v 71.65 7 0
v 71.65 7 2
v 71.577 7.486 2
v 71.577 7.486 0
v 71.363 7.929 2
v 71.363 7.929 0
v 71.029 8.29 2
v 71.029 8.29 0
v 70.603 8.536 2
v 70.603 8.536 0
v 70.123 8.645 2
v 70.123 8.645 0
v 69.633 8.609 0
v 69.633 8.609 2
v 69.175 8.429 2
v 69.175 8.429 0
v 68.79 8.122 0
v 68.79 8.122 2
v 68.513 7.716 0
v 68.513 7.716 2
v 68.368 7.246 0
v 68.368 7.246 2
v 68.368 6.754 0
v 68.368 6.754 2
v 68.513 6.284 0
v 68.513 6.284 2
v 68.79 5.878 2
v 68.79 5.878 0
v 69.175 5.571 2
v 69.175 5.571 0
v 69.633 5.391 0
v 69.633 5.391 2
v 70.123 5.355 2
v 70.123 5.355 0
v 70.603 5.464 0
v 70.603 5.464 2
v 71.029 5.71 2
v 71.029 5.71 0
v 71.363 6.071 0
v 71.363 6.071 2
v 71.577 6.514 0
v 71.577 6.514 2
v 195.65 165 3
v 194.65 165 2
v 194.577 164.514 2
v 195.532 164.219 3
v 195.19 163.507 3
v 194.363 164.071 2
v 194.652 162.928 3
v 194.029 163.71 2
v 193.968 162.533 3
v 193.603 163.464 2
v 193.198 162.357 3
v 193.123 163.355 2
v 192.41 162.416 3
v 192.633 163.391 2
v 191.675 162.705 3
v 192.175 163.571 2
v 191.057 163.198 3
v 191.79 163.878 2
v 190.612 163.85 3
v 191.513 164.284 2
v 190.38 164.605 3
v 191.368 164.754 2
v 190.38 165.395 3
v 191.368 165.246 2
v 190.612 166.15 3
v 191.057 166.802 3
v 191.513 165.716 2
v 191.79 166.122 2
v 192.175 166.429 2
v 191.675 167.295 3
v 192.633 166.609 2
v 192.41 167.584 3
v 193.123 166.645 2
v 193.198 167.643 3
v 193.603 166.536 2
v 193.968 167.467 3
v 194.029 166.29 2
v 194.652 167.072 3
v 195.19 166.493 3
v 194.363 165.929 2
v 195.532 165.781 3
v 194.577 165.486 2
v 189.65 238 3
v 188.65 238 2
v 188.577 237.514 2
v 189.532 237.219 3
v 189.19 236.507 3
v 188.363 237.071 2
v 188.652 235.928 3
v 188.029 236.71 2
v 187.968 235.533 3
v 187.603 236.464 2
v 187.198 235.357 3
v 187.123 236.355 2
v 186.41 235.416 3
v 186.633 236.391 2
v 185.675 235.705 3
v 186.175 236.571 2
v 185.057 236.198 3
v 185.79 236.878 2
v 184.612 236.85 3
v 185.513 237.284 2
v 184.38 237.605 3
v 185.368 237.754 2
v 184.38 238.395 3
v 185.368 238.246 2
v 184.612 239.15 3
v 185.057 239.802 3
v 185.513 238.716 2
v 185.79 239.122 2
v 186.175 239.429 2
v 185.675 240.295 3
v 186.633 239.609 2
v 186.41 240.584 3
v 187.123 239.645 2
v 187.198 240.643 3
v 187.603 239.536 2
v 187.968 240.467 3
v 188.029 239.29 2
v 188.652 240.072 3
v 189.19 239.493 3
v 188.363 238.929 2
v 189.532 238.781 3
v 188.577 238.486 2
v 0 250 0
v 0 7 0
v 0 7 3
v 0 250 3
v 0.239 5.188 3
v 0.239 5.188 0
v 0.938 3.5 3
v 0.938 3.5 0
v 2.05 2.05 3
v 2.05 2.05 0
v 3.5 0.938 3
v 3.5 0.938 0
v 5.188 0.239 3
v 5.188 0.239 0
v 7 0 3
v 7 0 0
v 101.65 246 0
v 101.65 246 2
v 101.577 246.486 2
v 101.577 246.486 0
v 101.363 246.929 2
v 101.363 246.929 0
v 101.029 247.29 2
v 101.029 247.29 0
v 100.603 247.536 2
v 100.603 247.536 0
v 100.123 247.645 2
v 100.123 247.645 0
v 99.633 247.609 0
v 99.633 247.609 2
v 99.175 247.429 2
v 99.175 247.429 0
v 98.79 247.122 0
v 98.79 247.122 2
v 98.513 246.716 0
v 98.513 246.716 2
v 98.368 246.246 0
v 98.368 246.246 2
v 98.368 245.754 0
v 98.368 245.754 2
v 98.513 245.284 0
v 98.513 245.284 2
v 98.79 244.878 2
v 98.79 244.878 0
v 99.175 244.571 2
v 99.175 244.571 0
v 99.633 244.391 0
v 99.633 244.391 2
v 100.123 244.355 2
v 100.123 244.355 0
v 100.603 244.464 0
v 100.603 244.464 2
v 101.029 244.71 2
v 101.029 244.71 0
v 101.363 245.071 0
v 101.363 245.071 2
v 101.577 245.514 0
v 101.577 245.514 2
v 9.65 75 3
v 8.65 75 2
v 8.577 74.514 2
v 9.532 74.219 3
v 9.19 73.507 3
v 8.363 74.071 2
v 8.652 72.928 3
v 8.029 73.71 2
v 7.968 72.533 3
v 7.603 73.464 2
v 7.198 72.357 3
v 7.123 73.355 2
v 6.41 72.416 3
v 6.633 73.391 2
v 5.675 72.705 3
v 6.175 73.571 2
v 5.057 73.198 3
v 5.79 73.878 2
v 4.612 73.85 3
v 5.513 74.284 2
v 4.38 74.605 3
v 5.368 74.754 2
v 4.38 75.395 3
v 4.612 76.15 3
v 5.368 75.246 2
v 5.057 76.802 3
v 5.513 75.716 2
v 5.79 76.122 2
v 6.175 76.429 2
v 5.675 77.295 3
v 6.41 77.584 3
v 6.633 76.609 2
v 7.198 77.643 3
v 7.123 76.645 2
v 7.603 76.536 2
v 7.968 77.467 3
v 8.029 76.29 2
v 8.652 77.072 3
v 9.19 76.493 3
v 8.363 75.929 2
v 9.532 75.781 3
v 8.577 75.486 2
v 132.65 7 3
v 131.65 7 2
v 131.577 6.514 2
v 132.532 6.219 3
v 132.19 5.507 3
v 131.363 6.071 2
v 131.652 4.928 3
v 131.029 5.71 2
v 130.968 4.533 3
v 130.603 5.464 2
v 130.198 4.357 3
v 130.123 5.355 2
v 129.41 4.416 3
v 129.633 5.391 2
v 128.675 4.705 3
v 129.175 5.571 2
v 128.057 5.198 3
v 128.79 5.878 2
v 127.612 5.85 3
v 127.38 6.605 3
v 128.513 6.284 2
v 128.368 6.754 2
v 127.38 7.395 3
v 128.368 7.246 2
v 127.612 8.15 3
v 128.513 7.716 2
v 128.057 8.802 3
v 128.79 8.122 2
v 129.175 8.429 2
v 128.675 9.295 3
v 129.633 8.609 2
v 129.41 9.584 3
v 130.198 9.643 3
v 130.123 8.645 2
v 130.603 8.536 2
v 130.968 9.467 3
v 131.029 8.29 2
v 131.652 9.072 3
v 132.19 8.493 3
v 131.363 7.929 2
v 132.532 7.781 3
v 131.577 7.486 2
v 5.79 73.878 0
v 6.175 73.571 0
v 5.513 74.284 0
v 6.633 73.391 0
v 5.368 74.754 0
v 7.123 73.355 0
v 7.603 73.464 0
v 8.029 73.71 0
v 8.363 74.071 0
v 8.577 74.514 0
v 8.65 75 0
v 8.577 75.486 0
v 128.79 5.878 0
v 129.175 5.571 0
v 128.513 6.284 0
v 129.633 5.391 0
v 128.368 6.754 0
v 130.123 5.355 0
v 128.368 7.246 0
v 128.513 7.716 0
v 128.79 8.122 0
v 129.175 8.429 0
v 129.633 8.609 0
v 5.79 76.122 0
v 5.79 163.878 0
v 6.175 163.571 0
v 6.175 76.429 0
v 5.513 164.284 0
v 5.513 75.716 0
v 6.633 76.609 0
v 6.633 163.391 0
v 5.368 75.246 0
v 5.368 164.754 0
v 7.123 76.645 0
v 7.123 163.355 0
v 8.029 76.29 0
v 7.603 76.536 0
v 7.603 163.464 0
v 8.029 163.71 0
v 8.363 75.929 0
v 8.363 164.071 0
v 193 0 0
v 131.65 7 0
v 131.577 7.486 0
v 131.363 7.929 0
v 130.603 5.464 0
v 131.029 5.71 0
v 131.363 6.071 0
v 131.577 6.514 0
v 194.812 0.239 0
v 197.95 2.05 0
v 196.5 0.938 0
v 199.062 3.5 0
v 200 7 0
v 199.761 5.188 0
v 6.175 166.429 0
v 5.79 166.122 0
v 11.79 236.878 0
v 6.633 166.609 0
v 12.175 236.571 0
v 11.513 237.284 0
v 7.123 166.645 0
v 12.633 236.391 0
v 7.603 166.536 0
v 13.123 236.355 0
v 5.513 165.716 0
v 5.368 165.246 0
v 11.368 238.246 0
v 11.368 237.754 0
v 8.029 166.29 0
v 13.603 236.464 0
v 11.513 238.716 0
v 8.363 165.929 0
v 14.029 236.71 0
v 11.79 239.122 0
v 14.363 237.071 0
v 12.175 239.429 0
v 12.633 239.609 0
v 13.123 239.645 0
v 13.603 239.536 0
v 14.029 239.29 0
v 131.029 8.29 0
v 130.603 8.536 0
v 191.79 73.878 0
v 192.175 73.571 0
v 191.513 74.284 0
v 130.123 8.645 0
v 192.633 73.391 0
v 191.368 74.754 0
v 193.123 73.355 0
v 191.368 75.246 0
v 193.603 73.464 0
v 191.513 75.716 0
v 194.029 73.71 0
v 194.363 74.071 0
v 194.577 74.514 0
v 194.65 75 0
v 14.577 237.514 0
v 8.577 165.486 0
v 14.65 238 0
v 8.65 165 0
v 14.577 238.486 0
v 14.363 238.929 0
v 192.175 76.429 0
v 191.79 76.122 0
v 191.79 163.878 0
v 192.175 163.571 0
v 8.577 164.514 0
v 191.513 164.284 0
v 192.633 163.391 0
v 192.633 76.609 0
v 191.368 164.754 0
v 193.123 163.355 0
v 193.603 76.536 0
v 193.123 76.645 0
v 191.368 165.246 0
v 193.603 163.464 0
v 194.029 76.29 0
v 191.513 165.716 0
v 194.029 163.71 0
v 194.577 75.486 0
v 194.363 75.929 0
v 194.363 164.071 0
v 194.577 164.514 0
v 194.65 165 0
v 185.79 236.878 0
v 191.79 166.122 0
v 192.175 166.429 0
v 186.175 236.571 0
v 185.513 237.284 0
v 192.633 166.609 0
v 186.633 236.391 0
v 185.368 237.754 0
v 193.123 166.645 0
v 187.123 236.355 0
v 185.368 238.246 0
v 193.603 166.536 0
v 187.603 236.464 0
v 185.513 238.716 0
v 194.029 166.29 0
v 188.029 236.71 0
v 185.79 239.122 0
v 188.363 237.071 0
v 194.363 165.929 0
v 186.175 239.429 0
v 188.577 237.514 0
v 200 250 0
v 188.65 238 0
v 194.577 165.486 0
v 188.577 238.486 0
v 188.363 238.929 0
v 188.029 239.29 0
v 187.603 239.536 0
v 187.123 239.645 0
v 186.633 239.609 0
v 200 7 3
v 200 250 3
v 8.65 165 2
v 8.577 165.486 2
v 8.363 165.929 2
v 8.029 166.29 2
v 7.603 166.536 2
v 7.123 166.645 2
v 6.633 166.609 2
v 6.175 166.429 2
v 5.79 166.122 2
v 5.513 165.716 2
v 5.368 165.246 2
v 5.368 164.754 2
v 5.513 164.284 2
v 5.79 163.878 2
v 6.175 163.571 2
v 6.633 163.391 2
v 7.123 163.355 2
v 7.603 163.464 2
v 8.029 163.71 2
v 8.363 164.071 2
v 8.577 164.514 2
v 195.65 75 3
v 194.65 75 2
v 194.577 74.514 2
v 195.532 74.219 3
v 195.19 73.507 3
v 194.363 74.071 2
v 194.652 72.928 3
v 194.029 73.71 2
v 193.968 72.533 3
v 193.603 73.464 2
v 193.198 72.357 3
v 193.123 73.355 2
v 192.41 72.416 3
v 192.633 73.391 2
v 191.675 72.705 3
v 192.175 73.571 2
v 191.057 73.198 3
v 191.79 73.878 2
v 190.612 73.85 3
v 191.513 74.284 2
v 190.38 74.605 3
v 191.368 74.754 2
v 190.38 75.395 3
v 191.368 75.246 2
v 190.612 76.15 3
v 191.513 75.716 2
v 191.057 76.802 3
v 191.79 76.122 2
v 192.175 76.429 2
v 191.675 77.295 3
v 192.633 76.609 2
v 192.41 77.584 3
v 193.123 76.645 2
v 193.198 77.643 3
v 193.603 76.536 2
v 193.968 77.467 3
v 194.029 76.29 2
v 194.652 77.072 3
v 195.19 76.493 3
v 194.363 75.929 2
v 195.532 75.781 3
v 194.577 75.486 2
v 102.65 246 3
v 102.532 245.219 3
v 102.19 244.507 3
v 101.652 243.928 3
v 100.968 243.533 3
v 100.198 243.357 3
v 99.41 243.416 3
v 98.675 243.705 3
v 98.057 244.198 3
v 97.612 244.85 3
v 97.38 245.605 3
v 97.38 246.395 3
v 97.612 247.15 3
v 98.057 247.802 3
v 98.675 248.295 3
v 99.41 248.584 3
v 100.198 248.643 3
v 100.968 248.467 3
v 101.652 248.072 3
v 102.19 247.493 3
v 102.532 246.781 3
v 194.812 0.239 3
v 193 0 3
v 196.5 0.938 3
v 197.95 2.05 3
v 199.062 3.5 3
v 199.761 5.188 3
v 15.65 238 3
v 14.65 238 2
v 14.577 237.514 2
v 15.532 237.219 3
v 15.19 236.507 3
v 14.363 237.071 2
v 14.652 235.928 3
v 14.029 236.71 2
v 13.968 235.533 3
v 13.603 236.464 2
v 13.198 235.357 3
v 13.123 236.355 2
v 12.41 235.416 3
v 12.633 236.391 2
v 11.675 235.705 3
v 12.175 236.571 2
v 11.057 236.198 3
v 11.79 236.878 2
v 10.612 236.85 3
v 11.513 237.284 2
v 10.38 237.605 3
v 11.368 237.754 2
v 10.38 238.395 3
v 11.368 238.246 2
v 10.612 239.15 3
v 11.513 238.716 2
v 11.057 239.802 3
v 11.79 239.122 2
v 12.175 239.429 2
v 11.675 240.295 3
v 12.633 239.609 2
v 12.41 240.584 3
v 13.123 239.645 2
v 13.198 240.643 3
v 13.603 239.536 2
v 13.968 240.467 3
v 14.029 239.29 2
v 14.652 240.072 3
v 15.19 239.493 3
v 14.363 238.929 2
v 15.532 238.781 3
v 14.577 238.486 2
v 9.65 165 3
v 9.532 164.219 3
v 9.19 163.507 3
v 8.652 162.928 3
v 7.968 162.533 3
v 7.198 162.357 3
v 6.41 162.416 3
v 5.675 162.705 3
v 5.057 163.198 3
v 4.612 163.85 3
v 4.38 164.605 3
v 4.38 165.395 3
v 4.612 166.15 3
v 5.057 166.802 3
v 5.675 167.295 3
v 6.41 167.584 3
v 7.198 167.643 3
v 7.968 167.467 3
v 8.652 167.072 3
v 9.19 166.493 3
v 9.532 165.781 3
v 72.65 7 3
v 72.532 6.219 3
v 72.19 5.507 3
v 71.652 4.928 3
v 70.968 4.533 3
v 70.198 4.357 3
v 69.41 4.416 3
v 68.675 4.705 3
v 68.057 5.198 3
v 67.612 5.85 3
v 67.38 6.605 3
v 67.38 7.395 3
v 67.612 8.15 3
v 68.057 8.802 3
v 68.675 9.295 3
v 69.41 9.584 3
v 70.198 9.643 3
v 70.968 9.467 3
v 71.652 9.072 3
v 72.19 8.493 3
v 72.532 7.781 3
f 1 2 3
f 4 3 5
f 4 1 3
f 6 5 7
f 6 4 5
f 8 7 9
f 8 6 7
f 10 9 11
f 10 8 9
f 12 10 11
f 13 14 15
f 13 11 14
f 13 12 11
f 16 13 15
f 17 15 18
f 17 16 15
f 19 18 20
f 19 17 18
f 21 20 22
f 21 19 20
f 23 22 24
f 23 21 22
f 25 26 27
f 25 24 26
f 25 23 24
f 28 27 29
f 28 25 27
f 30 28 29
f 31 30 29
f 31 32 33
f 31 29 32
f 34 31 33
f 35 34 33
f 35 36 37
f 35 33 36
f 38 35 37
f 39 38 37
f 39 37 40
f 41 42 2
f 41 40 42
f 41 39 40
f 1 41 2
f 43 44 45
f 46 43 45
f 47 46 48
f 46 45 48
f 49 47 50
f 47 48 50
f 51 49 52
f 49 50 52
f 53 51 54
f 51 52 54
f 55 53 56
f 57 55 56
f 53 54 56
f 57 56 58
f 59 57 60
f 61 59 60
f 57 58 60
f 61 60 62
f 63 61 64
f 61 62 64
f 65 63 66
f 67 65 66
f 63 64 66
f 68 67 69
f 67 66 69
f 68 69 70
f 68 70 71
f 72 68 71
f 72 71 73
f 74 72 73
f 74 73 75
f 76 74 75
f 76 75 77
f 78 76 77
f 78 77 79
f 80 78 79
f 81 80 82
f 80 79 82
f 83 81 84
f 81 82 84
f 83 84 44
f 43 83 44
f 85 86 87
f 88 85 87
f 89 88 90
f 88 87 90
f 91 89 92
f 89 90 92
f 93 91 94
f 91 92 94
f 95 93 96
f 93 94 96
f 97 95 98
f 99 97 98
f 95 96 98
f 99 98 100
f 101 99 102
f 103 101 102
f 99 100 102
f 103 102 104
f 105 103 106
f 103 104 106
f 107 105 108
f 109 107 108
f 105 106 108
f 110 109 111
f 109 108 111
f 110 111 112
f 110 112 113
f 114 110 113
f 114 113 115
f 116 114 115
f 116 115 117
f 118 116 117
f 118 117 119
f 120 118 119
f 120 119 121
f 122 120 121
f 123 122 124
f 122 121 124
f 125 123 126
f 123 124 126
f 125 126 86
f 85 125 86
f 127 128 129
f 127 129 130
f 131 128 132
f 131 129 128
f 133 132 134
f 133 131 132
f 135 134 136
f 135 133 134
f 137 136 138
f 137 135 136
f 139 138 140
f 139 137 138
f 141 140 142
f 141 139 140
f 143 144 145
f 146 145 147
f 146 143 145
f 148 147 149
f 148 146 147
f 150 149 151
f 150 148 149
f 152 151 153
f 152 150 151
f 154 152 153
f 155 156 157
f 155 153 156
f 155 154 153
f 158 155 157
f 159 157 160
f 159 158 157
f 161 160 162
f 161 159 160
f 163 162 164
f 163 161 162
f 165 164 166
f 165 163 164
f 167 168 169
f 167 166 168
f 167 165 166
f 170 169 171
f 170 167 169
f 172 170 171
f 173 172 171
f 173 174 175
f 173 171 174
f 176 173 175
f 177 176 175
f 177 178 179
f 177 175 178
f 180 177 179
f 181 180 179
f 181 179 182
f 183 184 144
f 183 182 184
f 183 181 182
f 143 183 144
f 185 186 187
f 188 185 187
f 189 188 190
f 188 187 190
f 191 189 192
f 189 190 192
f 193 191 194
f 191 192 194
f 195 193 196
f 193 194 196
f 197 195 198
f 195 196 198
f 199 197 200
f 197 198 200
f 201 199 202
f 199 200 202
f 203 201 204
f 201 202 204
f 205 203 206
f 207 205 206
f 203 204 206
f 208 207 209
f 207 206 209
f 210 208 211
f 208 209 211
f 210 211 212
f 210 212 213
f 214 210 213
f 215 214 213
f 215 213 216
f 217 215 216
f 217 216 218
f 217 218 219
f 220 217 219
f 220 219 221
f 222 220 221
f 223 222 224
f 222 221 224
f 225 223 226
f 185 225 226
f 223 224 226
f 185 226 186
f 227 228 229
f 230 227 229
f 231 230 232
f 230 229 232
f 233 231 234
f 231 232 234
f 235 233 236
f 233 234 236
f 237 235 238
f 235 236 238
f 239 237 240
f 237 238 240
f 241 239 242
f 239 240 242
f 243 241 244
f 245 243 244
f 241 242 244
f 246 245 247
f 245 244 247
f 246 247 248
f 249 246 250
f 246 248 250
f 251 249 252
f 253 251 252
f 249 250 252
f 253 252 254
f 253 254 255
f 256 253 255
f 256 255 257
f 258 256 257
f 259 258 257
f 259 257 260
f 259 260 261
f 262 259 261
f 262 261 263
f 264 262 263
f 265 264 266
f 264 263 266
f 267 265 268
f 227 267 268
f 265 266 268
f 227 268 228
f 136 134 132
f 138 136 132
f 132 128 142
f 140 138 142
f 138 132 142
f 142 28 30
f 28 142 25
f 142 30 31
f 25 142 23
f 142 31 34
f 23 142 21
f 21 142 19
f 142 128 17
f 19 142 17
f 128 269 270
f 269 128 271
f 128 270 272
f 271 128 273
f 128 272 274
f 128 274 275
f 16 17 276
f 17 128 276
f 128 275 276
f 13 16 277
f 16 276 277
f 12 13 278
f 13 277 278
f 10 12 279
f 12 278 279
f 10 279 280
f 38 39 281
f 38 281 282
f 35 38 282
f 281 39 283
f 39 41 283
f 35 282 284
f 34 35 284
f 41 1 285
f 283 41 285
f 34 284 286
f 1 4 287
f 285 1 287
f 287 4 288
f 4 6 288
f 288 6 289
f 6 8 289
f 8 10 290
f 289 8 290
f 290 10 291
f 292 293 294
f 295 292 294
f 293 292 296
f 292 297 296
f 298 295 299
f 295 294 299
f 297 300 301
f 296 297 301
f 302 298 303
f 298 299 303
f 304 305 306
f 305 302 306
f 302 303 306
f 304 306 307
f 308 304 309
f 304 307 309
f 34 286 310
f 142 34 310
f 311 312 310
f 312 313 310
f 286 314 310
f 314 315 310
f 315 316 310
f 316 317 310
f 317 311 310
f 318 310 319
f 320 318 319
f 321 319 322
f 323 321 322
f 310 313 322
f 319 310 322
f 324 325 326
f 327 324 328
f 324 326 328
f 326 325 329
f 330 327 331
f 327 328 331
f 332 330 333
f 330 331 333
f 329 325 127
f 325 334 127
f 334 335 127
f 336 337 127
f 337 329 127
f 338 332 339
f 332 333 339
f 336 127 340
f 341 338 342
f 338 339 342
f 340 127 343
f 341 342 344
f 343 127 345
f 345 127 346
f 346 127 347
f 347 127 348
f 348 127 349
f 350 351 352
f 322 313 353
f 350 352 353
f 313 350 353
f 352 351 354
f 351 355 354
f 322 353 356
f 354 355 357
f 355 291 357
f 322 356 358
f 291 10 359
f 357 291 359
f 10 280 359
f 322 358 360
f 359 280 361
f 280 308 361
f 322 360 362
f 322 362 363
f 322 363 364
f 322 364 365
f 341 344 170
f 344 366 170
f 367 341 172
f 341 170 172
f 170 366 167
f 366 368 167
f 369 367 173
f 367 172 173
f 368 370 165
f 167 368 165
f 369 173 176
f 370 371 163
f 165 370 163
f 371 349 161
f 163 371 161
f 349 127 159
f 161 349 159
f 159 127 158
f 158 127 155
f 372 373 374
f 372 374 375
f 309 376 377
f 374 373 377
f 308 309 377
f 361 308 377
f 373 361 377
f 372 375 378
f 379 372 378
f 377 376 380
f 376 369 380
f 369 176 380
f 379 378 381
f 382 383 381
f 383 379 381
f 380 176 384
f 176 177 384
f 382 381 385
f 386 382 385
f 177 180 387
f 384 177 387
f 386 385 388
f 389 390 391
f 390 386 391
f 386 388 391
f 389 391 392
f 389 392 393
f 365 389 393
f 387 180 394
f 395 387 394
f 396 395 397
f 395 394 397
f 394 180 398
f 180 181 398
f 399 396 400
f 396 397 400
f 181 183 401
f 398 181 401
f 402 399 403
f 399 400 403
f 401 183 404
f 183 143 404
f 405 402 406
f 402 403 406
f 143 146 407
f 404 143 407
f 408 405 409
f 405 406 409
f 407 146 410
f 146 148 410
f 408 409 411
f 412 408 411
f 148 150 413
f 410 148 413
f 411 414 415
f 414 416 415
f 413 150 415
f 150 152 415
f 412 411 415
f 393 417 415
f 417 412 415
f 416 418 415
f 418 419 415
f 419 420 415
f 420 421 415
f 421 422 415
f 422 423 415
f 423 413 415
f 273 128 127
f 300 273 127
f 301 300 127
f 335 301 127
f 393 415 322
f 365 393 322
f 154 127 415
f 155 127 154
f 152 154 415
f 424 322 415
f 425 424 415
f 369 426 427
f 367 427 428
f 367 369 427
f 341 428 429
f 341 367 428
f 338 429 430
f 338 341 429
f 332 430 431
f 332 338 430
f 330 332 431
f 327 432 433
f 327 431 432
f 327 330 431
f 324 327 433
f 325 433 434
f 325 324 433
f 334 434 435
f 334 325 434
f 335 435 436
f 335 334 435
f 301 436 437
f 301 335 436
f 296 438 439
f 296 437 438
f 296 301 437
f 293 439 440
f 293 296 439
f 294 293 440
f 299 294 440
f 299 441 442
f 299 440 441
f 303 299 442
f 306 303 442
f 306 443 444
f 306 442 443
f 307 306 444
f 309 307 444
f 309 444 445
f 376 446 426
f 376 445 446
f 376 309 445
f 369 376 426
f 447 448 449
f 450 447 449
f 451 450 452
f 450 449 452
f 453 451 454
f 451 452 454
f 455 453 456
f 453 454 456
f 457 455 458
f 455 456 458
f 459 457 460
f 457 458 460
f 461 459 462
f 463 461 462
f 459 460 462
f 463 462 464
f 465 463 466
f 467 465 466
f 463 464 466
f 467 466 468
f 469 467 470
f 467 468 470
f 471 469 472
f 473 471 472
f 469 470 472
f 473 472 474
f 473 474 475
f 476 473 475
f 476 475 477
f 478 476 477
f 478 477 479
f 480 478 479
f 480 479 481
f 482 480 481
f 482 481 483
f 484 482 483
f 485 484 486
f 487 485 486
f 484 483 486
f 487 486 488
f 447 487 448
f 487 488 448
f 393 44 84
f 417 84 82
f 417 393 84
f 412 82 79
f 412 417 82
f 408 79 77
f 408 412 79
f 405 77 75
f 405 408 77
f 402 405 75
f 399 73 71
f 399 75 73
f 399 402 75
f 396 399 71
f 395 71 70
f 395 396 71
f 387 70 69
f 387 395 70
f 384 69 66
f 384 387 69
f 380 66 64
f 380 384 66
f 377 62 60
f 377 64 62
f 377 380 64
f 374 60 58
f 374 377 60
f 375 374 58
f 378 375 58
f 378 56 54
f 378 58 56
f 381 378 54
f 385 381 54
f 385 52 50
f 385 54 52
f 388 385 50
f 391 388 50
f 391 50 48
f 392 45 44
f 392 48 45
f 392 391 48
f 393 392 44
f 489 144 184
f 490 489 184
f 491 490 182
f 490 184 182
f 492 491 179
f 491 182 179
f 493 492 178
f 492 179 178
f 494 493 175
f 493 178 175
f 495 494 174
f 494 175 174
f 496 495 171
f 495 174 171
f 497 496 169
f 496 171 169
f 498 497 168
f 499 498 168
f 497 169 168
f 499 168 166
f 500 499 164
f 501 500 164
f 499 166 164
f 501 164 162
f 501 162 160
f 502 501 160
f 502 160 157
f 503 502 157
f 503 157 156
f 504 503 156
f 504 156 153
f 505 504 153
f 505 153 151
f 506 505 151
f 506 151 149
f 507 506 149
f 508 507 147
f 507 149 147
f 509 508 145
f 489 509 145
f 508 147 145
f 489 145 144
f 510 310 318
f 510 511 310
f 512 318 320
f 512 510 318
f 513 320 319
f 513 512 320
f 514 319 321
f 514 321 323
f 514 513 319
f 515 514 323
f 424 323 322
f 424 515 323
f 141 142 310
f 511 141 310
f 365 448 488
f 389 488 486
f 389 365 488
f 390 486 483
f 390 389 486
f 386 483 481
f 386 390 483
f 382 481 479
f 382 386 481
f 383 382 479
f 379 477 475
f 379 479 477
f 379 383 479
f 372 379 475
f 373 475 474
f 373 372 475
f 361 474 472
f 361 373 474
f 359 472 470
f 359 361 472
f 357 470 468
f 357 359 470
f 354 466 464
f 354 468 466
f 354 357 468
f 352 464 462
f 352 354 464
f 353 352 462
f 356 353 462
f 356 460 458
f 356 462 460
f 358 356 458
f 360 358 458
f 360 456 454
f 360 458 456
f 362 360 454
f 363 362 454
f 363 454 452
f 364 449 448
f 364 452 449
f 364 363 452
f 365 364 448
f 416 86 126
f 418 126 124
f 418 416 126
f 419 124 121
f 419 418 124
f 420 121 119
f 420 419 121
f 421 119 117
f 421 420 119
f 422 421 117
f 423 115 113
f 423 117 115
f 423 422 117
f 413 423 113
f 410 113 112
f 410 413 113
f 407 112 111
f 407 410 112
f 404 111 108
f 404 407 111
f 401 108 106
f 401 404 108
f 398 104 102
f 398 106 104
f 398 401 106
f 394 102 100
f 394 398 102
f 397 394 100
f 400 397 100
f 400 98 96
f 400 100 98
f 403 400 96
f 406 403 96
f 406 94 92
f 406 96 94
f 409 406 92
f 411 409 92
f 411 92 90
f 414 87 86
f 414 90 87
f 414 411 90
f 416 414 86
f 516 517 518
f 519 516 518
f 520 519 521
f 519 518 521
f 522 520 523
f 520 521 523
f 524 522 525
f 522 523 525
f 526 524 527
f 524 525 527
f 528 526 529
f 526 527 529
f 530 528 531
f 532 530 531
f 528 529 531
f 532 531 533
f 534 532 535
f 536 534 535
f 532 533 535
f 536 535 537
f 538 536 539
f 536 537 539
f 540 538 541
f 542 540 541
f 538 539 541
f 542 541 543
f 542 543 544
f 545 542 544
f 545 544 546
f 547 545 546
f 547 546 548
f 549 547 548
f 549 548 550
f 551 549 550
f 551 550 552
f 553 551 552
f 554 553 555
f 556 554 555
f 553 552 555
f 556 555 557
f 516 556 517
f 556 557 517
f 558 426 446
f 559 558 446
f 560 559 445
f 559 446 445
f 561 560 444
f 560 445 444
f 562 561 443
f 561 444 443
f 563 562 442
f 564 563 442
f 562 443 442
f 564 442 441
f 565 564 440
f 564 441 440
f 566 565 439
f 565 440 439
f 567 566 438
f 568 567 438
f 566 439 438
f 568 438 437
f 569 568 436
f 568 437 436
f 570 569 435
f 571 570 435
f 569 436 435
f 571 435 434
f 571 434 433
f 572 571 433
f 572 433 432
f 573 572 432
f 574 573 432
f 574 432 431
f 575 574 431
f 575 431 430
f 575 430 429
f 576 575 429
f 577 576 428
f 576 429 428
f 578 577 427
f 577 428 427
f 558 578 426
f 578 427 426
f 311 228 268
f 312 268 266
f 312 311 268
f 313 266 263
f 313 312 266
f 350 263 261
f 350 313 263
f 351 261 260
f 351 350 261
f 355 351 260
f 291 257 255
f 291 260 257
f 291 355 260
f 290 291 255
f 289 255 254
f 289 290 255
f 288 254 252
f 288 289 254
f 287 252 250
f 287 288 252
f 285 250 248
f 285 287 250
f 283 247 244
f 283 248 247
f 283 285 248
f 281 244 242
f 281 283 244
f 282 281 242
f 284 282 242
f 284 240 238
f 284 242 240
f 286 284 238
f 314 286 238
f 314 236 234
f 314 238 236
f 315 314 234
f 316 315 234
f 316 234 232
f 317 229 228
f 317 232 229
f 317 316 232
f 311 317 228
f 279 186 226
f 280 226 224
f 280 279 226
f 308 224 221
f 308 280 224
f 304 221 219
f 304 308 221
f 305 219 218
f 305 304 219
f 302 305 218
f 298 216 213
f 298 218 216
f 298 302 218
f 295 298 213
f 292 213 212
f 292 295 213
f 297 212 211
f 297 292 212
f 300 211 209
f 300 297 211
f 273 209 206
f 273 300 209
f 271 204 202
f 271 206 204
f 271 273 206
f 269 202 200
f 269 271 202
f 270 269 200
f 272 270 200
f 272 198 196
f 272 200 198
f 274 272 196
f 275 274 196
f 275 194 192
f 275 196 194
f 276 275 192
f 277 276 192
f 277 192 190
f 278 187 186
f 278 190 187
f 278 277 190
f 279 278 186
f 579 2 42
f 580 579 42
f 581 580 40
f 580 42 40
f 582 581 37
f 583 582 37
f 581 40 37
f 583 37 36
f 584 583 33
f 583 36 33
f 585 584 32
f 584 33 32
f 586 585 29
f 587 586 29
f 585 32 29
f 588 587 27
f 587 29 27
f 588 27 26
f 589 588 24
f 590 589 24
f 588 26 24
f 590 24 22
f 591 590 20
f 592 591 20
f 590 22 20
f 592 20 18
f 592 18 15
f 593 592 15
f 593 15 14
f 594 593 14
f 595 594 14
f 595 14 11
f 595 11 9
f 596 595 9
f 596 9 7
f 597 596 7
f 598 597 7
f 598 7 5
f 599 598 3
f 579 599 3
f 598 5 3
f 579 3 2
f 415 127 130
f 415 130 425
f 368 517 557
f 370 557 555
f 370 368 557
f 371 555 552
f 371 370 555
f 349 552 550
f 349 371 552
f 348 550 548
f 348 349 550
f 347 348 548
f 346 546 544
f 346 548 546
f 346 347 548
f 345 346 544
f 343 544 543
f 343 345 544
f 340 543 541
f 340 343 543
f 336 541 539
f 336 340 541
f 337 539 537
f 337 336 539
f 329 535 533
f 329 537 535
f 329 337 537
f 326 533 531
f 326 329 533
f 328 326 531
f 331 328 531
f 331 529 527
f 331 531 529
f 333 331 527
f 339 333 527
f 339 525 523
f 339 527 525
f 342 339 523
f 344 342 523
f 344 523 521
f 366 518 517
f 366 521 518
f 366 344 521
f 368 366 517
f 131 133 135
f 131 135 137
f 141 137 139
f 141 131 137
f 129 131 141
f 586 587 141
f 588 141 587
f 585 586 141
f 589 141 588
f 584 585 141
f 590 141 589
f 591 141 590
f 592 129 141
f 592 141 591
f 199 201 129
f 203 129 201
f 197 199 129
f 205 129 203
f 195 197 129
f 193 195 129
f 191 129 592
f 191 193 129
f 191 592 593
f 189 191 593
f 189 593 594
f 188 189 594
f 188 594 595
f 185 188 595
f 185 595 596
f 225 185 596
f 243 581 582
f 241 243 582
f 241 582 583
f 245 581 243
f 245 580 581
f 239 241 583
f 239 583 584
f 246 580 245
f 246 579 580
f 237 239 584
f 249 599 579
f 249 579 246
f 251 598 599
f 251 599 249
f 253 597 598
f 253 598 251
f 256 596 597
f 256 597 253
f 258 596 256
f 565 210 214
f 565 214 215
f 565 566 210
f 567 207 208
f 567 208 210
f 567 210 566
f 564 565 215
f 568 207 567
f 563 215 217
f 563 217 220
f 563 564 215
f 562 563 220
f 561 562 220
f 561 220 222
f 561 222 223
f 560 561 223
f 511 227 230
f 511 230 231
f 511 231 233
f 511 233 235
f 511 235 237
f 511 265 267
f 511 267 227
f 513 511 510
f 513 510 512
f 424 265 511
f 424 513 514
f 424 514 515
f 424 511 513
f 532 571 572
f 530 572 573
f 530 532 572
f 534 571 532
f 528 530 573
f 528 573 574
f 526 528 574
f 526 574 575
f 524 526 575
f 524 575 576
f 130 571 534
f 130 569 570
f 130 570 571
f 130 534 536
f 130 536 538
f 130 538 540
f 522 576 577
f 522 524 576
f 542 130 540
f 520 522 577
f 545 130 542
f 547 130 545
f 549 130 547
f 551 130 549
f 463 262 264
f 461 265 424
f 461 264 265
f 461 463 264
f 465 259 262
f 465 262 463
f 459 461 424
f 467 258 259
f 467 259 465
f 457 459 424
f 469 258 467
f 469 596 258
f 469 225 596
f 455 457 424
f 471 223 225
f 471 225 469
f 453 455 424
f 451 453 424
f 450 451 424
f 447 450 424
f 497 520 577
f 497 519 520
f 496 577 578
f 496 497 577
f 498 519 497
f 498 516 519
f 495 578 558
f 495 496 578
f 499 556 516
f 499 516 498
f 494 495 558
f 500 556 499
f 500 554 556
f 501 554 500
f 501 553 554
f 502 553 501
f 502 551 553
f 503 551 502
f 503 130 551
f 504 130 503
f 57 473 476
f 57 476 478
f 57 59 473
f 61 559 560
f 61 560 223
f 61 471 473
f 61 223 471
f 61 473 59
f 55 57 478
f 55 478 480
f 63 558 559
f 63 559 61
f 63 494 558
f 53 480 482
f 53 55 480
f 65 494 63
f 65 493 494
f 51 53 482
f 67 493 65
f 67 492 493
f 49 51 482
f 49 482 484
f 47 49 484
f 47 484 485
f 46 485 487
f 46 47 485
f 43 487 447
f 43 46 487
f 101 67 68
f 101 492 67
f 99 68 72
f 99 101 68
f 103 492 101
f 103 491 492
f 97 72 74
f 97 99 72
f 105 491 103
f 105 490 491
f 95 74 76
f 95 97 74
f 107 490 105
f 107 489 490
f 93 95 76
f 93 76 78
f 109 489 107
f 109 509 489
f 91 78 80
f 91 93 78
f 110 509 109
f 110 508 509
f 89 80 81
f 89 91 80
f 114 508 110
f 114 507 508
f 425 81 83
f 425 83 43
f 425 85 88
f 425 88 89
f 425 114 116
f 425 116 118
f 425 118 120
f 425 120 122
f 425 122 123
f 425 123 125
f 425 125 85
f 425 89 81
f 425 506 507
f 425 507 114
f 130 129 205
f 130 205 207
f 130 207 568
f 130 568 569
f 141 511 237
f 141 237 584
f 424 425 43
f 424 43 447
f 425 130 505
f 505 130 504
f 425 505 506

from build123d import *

# Parameters (mm, degrees)
SKETCH1_W           = 200
SKETCH1_H           = 250
BOSS_EXTRUDE1_DEPTH = 3
FILLET1_R           = 7
SKETCH2_R           = 1.65
CUT_EXTRUDE2_DEPTH  = 4
CHAMFER1_SIZE       = 1


with BuildPart() as part:
    # Sketch1 → Boss-Extrude1 (new body)
    with BuildSketch(Plane.XY):
        with Locations((100, 125)):
            Rectangle(SKETCH1_W, SKETCH1_H)
    extrude(amount=BOSS_EXTRUDE1_DEPTH)

    # Fillet1
    fillet1_edges = [part.edges().sort_by_distance(p)[0] for p in [
        (200, 0, 1.5),
        (0, 0, 1.5),
    ]]
    fillet(fillet1_edges, radius=FILLET1_R)

    # Sketch2 → Cut-Extrude2 (cut, through all)
    with BuildSketch(Plane.XY):
        with Locations((70, 7)):
            Circle(SKETCH2_R)
        with Locations((7, 75)):
            Circle(SKETCH2_R)
        with Locations((193, 75)):
            Circle(SKETCH2_R)
        with Locations((13, 238)):
            Circle(SKETCH2_R)
        with Locations((100, 246)):
            Circle(SKETCH2_R)
        with Locations((187, 238)):
            Circle(SKETCH2_R)
        with Locations((7, 165)):
            Circle(SKETCH2_R)
        with Locations((193, 165)):
            Circle(SKETCH2_R)
        with Locations((130, 7)):
            Circle(SKETCH2_R)
    extrude(amount=CUT_EXTRUDE2_DEPTH, mode=Mode.SUBTRACT)

    # Chamfer1
    chamfer1_edges = [part.edges().sort_by_distance(p)[0] for p in [
        (5.35, 75, 3),
        (191.35, 75, 3),
        (11.35, 238, 3),
        (98.35, 246, 3),
        (128.35, 7, 3),
        (191.35, 165, 3),
        (5.35, 165, 3),
        (185.35, 238, 3),
        (68.35, 7, 3),
    ]]
    chamfer(chamfer1_edges, length=CHAMFER1_SIZE)


solid = part.part
